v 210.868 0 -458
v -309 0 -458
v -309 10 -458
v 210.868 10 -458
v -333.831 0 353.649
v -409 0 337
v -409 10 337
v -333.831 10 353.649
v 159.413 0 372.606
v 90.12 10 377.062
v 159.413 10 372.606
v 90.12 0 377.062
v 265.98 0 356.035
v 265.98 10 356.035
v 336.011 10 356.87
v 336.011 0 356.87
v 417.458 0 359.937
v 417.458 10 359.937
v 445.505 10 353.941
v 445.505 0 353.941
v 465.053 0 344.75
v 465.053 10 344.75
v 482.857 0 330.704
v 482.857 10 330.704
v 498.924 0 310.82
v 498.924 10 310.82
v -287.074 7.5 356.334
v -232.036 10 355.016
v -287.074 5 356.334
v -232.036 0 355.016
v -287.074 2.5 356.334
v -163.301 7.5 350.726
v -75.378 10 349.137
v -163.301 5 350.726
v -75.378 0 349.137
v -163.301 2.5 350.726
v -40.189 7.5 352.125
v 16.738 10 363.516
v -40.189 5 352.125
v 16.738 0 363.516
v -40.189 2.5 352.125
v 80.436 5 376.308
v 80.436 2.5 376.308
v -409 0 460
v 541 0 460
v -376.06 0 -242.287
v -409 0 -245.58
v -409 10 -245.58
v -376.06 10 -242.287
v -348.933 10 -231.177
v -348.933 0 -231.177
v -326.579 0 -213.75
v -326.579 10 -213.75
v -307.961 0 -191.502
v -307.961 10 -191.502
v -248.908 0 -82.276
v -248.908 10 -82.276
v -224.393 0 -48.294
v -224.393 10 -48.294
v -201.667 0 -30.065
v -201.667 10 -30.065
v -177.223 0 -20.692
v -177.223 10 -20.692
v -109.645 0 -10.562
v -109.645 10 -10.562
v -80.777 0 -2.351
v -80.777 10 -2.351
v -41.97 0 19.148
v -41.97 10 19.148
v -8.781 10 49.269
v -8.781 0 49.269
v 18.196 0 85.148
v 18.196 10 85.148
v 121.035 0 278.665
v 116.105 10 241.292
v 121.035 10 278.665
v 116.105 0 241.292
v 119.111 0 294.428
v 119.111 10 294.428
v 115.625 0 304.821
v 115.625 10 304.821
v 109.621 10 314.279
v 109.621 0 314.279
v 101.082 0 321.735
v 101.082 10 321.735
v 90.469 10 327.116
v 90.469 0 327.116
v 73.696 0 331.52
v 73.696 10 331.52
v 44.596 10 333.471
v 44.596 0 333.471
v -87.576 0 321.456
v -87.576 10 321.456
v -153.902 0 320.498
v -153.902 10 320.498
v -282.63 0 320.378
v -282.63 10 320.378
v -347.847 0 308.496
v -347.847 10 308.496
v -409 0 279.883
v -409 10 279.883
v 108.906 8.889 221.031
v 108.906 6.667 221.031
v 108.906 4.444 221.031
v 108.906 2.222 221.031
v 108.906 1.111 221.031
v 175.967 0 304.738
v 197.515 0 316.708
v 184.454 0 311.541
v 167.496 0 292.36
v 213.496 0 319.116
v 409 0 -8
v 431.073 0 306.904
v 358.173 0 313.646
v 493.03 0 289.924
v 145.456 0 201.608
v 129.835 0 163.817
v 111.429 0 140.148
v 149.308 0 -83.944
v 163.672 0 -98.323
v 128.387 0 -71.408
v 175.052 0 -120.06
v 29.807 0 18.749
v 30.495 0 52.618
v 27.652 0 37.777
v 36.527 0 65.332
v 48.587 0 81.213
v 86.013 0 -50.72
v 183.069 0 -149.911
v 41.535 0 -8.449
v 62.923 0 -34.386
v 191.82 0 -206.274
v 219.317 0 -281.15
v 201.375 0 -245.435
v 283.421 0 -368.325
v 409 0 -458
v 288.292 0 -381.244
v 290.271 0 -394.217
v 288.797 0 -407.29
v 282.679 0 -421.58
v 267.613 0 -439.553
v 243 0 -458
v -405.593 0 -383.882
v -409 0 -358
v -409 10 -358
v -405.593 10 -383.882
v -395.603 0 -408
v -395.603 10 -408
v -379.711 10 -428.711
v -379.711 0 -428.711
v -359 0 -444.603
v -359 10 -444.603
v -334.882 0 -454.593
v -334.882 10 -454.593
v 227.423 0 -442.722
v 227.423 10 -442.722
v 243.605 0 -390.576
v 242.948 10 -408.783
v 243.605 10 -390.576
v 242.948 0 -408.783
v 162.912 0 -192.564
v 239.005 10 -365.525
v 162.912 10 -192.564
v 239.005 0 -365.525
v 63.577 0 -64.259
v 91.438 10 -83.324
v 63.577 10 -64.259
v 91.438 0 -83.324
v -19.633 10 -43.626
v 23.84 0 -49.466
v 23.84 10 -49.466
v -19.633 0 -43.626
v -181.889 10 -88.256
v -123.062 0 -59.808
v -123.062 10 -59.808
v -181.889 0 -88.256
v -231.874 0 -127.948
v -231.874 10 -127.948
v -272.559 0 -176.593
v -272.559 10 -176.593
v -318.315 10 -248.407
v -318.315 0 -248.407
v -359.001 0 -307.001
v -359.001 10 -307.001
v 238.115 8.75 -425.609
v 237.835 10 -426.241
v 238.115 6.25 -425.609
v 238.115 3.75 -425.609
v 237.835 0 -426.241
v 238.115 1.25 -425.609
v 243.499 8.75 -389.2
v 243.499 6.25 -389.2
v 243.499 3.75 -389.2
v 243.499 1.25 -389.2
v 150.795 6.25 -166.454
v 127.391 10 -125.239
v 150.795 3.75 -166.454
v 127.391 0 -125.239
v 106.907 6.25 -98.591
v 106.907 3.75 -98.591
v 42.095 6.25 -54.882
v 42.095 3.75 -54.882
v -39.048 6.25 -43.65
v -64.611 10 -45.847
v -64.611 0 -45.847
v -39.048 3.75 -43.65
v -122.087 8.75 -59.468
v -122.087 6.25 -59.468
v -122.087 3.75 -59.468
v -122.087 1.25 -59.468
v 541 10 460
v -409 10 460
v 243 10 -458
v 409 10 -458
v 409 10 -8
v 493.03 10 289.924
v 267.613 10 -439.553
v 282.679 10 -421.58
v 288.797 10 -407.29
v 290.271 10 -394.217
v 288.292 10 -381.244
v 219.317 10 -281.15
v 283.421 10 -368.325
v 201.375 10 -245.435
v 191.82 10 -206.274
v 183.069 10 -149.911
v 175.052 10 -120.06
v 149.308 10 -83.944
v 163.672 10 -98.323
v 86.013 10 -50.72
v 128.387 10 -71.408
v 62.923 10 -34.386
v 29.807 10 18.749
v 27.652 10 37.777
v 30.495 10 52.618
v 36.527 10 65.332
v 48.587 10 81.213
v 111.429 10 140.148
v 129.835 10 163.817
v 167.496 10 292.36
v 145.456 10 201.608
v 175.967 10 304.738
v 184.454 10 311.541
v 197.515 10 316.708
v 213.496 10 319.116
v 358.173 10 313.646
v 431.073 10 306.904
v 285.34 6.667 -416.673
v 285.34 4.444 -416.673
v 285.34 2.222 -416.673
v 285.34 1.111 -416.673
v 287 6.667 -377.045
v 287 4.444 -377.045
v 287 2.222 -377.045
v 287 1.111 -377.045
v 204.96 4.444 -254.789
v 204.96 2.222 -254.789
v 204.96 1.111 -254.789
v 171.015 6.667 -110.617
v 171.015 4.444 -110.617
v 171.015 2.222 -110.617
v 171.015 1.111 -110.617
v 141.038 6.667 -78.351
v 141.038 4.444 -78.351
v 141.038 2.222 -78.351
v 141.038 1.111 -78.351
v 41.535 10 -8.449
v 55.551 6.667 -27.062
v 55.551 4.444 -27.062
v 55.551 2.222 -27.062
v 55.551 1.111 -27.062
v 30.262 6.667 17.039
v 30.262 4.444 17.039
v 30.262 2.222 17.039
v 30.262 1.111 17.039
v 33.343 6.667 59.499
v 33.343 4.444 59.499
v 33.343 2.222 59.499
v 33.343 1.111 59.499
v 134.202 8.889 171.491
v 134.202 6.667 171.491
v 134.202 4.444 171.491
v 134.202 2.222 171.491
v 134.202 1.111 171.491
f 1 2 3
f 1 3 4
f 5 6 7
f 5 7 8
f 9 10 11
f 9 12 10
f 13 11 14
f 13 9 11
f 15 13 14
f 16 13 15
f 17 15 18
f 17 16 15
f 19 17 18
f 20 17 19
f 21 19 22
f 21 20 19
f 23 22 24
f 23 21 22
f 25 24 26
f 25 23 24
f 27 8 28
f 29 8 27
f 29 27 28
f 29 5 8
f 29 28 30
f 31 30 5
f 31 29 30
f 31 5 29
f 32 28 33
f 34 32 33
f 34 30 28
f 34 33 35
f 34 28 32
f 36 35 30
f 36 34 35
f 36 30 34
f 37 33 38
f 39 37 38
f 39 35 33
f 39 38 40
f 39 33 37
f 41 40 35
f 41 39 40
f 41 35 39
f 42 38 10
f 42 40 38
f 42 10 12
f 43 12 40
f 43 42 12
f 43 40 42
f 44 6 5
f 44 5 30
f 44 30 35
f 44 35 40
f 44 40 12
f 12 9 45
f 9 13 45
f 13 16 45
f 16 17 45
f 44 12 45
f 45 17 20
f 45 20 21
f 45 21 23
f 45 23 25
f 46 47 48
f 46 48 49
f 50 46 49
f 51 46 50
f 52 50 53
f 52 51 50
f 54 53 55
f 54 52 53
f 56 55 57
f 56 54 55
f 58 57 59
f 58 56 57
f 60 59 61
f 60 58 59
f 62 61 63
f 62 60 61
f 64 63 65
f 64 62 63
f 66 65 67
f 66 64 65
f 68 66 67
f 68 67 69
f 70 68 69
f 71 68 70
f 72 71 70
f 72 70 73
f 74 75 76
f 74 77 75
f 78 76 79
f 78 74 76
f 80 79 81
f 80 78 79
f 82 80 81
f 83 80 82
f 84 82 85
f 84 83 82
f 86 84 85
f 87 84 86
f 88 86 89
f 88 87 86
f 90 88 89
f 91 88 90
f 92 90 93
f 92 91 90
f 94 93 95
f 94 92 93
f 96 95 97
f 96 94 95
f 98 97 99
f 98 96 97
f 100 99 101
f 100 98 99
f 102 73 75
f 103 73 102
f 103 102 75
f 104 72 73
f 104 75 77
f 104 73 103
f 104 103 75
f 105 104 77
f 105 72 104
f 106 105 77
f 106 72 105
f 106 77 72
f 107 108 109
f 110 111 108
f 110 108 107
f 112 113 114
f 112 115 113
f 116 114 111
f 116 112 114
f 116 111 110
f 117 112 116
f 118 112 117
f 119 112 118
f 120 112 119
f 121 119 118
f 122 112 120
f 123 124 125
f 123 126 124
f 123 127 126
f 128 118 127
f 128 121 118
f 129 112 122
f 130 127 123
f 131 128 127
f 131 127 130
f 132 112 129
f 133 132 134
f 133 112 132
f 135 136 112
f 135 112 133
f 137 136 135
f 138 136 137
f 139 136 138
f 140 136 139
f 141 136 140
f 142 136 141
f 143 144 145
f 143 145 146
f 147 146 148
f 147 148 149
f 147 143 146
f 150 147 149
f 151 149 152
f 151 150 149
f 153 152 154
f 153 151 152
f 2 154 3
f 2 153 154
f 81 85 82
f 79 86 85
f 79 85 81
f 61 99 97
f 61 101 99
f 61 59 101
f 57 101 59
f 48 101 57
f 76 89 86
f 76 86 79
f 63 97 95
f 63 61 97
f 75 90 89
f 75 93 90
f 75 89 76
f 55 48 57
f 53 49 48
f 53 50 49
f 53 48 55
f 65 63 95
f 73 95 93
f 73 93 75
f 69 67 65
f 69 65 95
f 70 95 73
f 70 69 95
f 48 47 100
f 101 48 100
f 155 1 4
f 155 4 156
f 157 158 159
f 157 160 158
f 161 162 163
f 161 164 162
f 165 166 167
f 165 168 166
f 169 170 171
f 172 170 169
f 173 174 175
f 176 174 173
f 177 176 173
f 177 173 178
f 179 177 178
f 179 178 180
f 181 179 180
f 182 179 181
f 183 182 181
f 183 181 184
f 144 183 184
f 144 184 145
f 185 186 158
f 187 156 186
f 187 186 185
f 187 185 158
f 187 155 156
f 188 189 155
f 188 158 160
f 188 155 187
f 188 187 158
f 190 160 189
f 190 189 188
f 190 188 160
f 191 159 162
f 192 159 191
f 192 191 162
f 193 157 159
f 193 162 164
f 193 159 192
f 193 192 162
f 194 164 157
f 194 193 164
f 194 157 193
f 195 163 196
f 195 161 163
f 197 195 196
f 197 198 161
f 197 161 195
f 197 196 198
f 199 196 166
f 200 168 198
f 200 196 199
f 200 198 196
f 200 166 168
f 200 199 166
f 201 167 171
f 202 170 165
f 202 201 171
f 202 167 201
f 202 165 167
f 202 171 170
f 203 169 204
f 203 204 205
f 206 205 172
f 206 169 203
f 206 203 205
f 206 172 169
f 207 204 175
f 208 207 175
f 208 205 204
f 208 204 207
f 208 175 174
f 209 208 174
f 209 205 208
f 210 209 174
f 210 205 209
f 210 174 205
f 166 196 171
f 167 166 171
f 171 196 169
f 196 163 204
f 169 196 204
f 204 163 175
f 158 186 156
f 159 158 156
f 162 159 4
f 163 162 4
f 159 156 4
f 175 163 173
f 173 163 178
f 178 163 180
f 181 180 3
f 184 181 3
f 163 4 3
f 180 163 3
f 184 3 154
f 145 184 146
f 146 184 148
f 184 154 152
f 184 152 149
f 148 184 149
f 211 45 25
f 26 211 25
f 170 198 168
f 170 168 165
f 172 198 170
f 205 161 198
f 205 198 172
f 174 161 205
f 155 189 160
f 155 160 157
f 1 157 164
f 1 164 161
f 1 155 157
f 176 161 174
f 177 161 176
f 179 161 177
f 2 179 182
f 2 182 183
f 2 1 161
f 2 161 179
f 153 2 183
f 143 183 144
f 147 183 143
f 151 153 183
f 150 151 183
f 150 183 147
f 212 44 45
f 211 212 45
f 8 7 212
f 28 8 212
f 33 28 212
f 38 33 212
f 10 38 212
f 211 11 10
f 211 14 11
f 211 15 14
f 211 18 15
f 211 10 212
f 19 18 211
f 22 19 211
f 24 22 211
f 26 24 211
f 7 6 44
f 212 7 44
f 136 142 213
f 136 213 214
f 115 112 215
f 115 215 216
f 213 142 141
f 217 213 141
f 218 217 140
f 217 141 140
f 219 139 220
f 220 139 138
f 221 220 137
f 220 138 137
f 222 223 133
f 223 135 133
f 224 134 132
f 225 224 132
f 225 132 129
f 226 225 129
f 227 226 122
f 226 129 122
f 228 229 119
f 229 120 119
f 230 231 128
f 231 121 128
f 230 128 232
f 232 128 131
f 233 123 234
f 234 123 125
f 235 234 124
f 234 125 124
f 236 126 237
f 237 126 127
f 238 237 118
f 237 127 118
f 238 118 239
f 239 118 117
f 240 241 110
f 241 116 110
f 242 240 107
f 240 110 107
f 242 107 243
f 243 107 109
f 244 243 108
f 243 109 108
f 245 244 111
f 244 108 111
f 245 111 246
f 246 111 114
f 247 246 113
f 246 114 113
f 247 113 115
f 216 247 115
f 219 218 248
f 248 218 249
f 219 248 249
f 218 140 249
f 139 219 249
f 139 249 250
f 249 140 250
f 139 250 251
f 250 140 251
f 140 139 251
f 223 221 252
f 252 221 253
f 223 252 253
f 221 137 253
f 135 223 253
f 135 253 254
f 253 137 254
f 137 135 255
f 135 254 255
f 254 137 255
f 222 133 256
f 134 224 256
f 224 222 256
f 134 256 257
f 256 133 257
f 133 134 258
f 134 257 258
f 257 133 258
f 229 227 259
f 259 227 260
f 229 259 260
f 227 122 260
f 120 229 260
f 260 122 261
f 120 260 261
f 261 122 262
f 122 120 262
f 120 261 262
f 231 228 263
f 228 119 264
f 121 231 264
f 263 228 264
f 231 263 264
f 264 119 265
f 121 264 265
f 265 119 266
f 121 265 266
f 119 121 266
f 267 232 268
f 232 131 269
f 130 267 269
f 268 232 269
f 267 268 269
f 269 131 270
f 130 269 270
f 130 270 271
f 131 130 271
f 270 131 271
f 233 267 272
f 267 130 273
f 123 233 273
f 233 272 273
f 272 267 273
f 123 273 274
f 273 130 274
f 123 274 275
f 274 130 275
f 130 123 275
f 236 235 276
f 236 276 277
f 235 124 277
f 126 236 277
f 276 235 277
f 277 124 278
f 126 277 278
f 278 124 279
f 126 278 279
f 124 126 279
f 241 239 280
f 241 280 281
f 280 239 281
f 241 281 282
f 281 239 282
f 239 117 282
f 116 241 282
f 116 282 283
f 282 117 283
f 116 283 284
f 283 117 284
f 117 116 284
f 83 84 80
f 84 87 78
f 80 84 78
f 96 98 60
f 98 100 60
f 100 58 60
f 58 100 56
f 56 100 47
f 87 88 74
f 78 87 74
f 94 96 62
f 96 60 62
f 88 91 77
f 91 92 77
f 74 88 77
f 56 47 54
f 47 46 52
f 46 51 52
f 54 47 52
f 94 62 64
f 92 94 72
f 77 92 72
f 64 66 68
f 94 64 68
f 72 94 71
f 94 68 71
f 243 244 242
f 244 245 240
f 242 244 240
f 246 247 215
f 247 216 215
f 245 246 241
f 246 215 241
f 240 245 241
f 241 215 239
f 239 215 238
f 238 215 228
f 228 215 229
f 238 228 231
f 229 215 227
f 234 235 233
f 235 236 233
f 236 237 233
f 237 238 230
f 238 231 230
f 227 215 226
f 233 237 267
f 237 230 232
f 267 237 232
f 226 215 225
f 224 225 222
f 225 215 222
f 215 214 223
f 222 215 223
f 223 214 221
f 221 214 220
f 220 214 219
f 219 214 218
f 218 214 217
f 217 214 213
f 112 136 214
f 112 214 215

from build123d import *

# Parameters (mm, degrees)
EXTRUDE_4_DEPTH   = 10
EXTRUDE_4_2_DEPTH = 10
EXTRUDE_4_3_DEPTH = 10
EXTRUDE_4_4_DEPTH = 10


with BuildPart() as part:
    # 草图1 → 凸台-拉伸4 (new body)
    with BuildSketch(Plane(origin=(0, 0, 0), x_dir=(1, 0, 0), z_dir=(0, 1, 0))):
        with BuildLine():
            add(Edge.make_bspline(
                [(210.868291071, 458), (269.589316795, 414.930776235), (222.943597072, 326.171009864), (177.782564772, 228.677919451), (145.156787101, 147.87181362), (67.223880115, 35.666252711), (-119.045799991, 36.504185318), (-246.879340721, 130.670668224), (-319.221459075, 251.456304014), (-366.458980173, 324.006011189), (-409, 358)],
                knots=[0, 0, 0, 0, 0.163728442, 0.235377211, 0.313668619, 0.410963639, 0.603027814, 0.754879506, 0.848370003, 1, 1, 1, 1], degree=3))
            ThreePointArc((-409, 358), (-379.710678119, 428.710678119), (-309, 458))
            Line((-309, 458), (210.868291071, 458))
        make_face()
    extrude(amount=EXTRUDE_4_DEPTH)


with BuildPart() as body_2:
    # 草图1 → Extrude 4 2 (new body)
    with BuildSketch(Plane(origin=(0, 0, 0), x_dir=(1, 0, 0), z_dir=(0, 1, 0))):
        with BuildLine():
            Line((-409, 245.580356436), (-409, -279.882850733))
            add(Edge.make_bspline(
                [(-409, 245.580356436), (-275.993080971, 249.67464746), (-283.602777577, 7.370788986), (-74.803745743, 19.744676597), (8.390053541, -58.203971056), (52.977793648, -153.228845866), (116.989970073, -206.854063036), (133.000643295, -345.497902872), (-10.047723972, -329.363469332), (-171.74536102, -310.363611115), (-318.826566789, -340.399765198), (-409, -279.882850733)],
                knots=[0, 0, 0, 0, 0.233311569, 0.306255308, 0.417893684, 0.46387814, 0.538957902, 0.605999424, 0.700982218, 0.770983119, 1, 1, 1, 1], degree=3))
        make_face()
    extrude(amount=EXTRUDE_4_2_DEPTH)


with BuildPart() as body_3:
    # 草图1 → Extrude 4 3 (new body)
    with BuildSketch(Plane(origin=(0, 0, 0), x_dir=(1, 0, 0), z_dir=(0, 1, 0))):
        with BuildLine():
            Line((409, 458), (409, 8))
            Line((409, 8), (493.02995153, -289.924373606))
            add(Edge.make_bspline(
                [(243, 458), (349.792563252, 390.973836458), (213.96274263, 317.054977903), (186.913088276, 187.44659362), (177.707663744, 74.856334367), (63.930178811, 57.213587703), (-6.80416306, -75.316966125), (170.350641389, -139.1916096), (143.991792504, -330.865859781), (329.024238386, -307.915291767), (414.200144681, -319.688768205), (493.02995153, -289.924373606)],
                knots=[0, 0, 0, 0, 0.184875451, 0.245347746, 0.332115564, 0.420312273, 0.488752844, 0.627085994, 0.747050317, 0.817526216, 1, 1, 1, 1], degree=3))
            Line((243, 458), (409, 458))
        make_face()
    extrude(amount=EXTRUDE_4_3_DEPTH)


with BuildPart() as body_4:
    # 草图1 → Extrude 4 4 (new body)
    with BuildSketch(Plane(origin=(0, 0, 0), x_dir=(1, 0, 0), z_dir=(0, 1, 0))):
        with BuildLine():
            Line((-409, -460), (541, -460))
            Line((541, -460), (498.923674422, -310.820300222))
            add(Edge.make_bspline(
                [(-409, -337), (-282.053839651, -381.85033693), (-112.633395527, -318.254759818), (117.766188012, -397.110113328), (292.633766387, -325.190205846), (450.400424233, -384.951409885), (498.923674422, -310.820300222)],
                knots=[0, 0, 0, 0, 0.42068171, 0.530959381, 0.765334228, 1, 1, 1, 1], degree=3))
            Line((-409, -337), (-409, -460))
        make_face()
    extrude(amount=EXTRUDE_4_4_DEPTH)


solid = Compound([part.part, body_2.part, body_3.part, body_4.part])
